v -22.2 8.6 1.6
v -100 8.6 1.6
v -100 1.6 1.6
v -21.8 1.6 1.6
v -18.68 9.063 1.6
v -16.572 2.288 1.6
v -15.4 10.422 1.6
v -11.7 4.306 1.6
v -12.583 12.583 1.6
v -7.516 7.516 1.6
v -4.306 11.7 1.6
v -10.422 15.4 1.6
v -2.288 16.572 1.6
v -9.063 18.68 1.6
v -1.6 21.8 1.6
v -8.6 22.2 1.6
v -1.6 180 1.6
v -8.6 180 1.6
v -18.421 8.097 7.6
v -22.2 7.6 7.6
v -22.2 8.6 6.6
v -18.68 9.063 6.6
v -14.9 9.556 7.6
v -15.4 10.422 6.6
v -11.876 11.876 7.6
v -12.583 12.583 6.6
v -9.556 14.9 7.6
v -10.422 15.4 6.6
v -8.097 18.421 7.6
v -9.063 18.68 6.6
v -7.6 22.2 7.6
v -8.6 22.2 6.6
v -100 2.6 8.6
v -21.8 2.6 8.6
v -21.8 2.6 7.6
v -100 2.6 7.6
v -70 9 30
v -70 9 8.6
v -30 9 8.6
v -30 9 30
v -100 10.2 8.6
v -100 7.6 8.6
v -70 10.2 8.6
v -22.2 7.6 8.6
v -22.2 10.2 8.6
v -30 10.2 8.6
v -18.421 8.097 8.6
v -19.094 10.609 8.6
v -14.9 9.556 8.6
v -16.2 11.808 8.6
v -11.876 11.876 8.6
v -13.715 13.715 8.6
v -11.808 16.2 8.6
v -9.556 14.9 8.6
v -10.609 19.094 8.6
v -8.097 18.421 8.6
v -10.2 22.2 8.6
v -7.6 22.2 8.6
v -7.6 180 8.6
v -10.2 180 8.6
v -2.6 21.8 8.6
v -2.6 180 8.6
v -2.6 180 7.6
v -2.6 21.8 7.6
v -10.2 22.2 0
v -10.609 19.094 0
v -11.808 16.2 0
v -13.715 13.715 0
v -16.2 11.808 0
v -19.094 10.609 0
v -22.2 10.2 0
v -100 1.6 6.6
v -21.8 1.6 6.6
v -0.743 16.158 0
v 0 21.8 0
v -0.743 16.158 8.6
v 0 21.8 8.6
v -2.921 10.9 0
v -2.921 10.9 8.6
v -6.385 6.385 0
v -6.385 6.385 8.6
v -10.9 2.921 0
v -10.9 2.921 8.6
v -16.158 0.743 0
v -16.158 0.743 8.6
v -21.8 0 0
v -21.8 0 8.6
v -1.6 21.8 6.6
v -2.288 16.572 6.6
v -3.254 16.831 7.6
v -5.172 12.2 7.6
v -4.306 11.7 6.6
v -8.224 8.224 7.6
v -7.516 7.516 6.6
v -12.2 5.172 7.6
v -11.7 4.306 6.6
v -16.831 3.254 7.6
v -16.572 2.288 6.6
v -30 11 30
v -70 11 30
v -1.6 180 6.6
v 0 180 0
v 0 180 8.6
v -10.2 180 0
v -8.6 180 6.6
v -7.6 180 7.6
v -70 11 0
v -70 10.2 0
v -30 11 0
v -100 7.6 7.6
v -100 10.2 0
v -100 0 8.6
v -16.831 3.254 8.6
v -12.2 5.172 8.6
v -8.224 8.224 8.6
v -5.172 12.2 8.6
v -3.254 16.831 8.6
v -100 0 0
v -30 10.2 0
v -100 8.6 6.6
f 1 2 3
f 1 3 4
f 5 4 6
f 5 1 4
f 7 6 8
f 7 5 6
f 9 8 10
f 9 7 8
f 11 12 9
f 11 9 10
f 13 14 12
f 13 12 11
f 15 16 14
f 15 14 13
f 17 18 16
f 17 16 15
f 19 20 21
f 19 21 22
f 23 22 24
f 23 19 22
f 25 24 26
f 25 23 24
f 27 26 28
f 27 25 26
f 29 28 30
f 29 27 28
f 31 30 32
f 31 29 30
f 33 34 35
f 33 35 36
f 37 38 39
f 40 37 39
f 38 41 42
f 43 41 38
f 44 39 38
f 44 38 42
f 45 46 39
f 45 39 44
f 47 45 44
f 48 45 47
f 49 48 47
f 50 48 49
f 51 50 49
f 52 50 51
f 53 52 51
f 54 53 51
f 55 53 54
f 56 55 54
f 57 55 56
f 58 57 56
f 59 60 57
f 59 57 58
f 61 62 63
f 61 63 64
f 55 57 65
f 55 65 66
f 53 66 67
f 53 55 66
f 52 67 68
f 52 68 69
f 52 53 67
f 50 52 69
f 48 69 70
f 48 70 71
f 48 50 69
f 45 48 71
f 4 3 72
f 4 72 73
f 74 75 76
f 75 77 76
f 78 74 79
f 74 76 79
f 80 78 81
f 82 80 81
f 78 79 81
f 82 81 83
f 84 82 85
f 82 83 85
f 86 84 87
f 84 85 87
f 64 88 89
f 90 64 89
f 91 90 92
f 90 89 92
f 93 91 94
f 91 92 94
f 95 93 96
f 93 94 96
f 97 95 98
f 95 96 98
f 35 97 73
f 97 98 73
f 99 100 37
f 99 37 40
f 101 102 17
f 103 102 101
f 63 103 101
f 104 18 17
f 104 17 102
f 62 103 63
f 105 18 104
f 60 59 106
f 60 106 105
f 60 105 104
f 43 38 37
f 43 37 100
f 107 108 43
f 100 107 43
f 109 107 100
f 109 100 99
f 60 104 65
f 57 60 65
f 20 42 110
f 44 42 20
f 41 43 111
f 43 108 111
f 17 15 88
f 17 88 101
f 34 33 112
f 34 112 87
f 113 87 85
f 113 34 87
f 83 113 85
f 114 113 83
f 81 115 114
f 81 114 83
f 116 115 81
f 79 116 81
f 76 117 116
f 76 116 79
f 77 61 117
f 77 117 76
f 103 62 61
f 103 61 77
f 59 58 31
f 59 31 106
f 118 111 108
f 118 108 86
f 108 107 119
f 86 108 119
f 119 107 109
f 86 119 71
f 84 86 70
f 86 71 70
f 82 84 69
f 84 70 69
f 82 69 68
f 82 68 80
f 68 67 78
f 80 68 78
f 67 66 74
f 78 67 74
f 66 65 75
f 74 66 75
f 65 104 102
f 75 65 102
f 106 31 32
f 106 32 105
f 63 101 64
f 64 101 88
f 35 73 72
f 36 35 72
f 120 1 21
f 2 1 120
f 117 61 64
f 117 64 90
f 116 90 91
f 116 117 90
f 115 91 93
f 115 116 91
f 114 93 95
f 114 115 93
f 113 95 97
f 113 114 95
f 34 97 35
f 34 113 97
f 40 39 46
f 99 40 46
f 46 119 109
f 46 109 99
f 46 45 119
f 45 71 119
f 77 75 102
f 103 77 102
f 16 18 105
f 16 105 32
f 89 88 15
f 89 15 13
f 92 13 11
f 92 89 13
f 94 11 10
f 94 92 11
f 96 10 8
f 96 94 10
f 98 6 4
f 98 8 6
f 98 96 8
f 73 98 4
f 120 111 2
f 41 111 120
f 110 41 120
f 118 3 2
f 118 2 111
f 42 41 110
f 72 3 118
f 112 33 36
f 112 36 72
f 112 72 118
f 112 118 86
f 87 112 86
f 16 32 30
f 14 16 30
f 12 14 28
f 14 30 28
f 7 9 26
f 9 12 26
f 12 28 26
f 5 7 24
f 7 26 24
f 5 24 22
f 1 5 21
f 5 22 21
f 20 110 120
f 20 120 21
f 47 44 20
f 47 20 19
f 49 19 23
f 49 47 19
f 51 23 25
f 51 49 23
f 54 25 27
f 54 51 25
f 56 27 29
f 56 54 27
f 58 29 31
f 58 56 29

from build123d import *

# Parameters (mm, degrees)
F1_DEPTH = 8.6
F2_R     = 12
F3_R     = 21.8
F4_T     = -1.6
F6_DEPTH = 2
F7_SIZE  = 0.99999
F8_W     = 40
F8_H     = 2
F9_DEPTH = 30


# Not quite as in the source:
# - a fillet or chamfer is up to 0.001 mm smaller than in the source, because OpenCascade refuses the exact size


with BuildPart() as f1:
    # F0 (on Top) → F1 (new body)
    with BuildSketch(Plane.XY):
        Polygon((0, 0), (0, 180), (-10.2, 180), (-10.2, 10.2), (-100, 10.2), (-100, 0), align=None)
    extrude(amount=F1_DEPTH)

    # F2
    f2_edges = [f1.edges().sort_by_distance(p)[0] for p in [
        (-10.2, 10.2, 4.3),
    ]]
    fillet(f2_edges, radius=F2_R)

    # F3
    f3_edges = [f1.edges().sort_by_distance(p)[0] for p in [
        (0, 0, 4.3),
    ]]
    fillet(f3_edges, radius=F3_R)

    # F4
    f4_openings = [f1.faces().sort_by_distance(p)[0] for p in [
        (-100, 5.1, 4.3),
        (-2.059126, 100.9, 8.6),
        (-5.1, 180, 4.3),
    ]]
    offset(amount=F4_T, openings=f4_openings)

    # F5 (on face) → F6 (join)
    with BuildSketch(Plane.XY.offset(8.6)):
        with BuildLine():
            ThreePointArc((-22.2, 7.6), (-11.8762409947, 11.8762409947), (-7.6, 22.2))
            Line((-7.6, 22.2), (-7.6, 180))
            Line((-7.6, 180), (-10.2, 180))
            Line((-10.2, 180), (-10.2, 22.2))
            ThreePointArc((-10.2, 22.2), (-13.7147186258, 13.7147186258), (-22.2, 10.2))
            Line((-22.2, 10.2), (-100, 10.2))
            Line((-100, 10.2), (-100, 7.6))
            Line((-100, 7.6), (-22.2, 7.6))
        make_face()
        with BuildLine():
            Line((0, 21.8), (0, 180))
            Line((0, 180), (-2.6, 180))
            Line((-2.6, 180), (-2.6, 21.8))
            ThreePointArc((-2.6, 21.8), (-8.2235498012, 8.2235498012), (-21.8, 2.6))
            Line((-21.8, 2.6), (-100, 2.6))
            Line((-100, 2.6), (-100, 0))
            Line((-100, 0), (-21.8, 0))
            ThreePointArc((-21.8, 0), (-6.3850721701, 6.3850721701), (0, 21.8))
        make_face()
    extrude(amount=-F6_DEPTH)

    # F7 (size 1 in the source; OpenCascade refuses exactly that, so slightly less here)
    f7_edges = [f1.edges().sort_by_distance(p)[0] for p in [
        (-61.1, 7.6, 6.6),
        (-60.9, 2.6, 6.6),
    ]]
    chamfer(f7_edges, length=F7_SIZE)

    # F8 (on Top) → F9 (join)
    with BuildSketch(Plane.XY):
        with Locations((-50, 10)):
            Rectangle(F8_W, F8_H)
    extrude(amount=F9_DEPTH)


solid = f1.part
